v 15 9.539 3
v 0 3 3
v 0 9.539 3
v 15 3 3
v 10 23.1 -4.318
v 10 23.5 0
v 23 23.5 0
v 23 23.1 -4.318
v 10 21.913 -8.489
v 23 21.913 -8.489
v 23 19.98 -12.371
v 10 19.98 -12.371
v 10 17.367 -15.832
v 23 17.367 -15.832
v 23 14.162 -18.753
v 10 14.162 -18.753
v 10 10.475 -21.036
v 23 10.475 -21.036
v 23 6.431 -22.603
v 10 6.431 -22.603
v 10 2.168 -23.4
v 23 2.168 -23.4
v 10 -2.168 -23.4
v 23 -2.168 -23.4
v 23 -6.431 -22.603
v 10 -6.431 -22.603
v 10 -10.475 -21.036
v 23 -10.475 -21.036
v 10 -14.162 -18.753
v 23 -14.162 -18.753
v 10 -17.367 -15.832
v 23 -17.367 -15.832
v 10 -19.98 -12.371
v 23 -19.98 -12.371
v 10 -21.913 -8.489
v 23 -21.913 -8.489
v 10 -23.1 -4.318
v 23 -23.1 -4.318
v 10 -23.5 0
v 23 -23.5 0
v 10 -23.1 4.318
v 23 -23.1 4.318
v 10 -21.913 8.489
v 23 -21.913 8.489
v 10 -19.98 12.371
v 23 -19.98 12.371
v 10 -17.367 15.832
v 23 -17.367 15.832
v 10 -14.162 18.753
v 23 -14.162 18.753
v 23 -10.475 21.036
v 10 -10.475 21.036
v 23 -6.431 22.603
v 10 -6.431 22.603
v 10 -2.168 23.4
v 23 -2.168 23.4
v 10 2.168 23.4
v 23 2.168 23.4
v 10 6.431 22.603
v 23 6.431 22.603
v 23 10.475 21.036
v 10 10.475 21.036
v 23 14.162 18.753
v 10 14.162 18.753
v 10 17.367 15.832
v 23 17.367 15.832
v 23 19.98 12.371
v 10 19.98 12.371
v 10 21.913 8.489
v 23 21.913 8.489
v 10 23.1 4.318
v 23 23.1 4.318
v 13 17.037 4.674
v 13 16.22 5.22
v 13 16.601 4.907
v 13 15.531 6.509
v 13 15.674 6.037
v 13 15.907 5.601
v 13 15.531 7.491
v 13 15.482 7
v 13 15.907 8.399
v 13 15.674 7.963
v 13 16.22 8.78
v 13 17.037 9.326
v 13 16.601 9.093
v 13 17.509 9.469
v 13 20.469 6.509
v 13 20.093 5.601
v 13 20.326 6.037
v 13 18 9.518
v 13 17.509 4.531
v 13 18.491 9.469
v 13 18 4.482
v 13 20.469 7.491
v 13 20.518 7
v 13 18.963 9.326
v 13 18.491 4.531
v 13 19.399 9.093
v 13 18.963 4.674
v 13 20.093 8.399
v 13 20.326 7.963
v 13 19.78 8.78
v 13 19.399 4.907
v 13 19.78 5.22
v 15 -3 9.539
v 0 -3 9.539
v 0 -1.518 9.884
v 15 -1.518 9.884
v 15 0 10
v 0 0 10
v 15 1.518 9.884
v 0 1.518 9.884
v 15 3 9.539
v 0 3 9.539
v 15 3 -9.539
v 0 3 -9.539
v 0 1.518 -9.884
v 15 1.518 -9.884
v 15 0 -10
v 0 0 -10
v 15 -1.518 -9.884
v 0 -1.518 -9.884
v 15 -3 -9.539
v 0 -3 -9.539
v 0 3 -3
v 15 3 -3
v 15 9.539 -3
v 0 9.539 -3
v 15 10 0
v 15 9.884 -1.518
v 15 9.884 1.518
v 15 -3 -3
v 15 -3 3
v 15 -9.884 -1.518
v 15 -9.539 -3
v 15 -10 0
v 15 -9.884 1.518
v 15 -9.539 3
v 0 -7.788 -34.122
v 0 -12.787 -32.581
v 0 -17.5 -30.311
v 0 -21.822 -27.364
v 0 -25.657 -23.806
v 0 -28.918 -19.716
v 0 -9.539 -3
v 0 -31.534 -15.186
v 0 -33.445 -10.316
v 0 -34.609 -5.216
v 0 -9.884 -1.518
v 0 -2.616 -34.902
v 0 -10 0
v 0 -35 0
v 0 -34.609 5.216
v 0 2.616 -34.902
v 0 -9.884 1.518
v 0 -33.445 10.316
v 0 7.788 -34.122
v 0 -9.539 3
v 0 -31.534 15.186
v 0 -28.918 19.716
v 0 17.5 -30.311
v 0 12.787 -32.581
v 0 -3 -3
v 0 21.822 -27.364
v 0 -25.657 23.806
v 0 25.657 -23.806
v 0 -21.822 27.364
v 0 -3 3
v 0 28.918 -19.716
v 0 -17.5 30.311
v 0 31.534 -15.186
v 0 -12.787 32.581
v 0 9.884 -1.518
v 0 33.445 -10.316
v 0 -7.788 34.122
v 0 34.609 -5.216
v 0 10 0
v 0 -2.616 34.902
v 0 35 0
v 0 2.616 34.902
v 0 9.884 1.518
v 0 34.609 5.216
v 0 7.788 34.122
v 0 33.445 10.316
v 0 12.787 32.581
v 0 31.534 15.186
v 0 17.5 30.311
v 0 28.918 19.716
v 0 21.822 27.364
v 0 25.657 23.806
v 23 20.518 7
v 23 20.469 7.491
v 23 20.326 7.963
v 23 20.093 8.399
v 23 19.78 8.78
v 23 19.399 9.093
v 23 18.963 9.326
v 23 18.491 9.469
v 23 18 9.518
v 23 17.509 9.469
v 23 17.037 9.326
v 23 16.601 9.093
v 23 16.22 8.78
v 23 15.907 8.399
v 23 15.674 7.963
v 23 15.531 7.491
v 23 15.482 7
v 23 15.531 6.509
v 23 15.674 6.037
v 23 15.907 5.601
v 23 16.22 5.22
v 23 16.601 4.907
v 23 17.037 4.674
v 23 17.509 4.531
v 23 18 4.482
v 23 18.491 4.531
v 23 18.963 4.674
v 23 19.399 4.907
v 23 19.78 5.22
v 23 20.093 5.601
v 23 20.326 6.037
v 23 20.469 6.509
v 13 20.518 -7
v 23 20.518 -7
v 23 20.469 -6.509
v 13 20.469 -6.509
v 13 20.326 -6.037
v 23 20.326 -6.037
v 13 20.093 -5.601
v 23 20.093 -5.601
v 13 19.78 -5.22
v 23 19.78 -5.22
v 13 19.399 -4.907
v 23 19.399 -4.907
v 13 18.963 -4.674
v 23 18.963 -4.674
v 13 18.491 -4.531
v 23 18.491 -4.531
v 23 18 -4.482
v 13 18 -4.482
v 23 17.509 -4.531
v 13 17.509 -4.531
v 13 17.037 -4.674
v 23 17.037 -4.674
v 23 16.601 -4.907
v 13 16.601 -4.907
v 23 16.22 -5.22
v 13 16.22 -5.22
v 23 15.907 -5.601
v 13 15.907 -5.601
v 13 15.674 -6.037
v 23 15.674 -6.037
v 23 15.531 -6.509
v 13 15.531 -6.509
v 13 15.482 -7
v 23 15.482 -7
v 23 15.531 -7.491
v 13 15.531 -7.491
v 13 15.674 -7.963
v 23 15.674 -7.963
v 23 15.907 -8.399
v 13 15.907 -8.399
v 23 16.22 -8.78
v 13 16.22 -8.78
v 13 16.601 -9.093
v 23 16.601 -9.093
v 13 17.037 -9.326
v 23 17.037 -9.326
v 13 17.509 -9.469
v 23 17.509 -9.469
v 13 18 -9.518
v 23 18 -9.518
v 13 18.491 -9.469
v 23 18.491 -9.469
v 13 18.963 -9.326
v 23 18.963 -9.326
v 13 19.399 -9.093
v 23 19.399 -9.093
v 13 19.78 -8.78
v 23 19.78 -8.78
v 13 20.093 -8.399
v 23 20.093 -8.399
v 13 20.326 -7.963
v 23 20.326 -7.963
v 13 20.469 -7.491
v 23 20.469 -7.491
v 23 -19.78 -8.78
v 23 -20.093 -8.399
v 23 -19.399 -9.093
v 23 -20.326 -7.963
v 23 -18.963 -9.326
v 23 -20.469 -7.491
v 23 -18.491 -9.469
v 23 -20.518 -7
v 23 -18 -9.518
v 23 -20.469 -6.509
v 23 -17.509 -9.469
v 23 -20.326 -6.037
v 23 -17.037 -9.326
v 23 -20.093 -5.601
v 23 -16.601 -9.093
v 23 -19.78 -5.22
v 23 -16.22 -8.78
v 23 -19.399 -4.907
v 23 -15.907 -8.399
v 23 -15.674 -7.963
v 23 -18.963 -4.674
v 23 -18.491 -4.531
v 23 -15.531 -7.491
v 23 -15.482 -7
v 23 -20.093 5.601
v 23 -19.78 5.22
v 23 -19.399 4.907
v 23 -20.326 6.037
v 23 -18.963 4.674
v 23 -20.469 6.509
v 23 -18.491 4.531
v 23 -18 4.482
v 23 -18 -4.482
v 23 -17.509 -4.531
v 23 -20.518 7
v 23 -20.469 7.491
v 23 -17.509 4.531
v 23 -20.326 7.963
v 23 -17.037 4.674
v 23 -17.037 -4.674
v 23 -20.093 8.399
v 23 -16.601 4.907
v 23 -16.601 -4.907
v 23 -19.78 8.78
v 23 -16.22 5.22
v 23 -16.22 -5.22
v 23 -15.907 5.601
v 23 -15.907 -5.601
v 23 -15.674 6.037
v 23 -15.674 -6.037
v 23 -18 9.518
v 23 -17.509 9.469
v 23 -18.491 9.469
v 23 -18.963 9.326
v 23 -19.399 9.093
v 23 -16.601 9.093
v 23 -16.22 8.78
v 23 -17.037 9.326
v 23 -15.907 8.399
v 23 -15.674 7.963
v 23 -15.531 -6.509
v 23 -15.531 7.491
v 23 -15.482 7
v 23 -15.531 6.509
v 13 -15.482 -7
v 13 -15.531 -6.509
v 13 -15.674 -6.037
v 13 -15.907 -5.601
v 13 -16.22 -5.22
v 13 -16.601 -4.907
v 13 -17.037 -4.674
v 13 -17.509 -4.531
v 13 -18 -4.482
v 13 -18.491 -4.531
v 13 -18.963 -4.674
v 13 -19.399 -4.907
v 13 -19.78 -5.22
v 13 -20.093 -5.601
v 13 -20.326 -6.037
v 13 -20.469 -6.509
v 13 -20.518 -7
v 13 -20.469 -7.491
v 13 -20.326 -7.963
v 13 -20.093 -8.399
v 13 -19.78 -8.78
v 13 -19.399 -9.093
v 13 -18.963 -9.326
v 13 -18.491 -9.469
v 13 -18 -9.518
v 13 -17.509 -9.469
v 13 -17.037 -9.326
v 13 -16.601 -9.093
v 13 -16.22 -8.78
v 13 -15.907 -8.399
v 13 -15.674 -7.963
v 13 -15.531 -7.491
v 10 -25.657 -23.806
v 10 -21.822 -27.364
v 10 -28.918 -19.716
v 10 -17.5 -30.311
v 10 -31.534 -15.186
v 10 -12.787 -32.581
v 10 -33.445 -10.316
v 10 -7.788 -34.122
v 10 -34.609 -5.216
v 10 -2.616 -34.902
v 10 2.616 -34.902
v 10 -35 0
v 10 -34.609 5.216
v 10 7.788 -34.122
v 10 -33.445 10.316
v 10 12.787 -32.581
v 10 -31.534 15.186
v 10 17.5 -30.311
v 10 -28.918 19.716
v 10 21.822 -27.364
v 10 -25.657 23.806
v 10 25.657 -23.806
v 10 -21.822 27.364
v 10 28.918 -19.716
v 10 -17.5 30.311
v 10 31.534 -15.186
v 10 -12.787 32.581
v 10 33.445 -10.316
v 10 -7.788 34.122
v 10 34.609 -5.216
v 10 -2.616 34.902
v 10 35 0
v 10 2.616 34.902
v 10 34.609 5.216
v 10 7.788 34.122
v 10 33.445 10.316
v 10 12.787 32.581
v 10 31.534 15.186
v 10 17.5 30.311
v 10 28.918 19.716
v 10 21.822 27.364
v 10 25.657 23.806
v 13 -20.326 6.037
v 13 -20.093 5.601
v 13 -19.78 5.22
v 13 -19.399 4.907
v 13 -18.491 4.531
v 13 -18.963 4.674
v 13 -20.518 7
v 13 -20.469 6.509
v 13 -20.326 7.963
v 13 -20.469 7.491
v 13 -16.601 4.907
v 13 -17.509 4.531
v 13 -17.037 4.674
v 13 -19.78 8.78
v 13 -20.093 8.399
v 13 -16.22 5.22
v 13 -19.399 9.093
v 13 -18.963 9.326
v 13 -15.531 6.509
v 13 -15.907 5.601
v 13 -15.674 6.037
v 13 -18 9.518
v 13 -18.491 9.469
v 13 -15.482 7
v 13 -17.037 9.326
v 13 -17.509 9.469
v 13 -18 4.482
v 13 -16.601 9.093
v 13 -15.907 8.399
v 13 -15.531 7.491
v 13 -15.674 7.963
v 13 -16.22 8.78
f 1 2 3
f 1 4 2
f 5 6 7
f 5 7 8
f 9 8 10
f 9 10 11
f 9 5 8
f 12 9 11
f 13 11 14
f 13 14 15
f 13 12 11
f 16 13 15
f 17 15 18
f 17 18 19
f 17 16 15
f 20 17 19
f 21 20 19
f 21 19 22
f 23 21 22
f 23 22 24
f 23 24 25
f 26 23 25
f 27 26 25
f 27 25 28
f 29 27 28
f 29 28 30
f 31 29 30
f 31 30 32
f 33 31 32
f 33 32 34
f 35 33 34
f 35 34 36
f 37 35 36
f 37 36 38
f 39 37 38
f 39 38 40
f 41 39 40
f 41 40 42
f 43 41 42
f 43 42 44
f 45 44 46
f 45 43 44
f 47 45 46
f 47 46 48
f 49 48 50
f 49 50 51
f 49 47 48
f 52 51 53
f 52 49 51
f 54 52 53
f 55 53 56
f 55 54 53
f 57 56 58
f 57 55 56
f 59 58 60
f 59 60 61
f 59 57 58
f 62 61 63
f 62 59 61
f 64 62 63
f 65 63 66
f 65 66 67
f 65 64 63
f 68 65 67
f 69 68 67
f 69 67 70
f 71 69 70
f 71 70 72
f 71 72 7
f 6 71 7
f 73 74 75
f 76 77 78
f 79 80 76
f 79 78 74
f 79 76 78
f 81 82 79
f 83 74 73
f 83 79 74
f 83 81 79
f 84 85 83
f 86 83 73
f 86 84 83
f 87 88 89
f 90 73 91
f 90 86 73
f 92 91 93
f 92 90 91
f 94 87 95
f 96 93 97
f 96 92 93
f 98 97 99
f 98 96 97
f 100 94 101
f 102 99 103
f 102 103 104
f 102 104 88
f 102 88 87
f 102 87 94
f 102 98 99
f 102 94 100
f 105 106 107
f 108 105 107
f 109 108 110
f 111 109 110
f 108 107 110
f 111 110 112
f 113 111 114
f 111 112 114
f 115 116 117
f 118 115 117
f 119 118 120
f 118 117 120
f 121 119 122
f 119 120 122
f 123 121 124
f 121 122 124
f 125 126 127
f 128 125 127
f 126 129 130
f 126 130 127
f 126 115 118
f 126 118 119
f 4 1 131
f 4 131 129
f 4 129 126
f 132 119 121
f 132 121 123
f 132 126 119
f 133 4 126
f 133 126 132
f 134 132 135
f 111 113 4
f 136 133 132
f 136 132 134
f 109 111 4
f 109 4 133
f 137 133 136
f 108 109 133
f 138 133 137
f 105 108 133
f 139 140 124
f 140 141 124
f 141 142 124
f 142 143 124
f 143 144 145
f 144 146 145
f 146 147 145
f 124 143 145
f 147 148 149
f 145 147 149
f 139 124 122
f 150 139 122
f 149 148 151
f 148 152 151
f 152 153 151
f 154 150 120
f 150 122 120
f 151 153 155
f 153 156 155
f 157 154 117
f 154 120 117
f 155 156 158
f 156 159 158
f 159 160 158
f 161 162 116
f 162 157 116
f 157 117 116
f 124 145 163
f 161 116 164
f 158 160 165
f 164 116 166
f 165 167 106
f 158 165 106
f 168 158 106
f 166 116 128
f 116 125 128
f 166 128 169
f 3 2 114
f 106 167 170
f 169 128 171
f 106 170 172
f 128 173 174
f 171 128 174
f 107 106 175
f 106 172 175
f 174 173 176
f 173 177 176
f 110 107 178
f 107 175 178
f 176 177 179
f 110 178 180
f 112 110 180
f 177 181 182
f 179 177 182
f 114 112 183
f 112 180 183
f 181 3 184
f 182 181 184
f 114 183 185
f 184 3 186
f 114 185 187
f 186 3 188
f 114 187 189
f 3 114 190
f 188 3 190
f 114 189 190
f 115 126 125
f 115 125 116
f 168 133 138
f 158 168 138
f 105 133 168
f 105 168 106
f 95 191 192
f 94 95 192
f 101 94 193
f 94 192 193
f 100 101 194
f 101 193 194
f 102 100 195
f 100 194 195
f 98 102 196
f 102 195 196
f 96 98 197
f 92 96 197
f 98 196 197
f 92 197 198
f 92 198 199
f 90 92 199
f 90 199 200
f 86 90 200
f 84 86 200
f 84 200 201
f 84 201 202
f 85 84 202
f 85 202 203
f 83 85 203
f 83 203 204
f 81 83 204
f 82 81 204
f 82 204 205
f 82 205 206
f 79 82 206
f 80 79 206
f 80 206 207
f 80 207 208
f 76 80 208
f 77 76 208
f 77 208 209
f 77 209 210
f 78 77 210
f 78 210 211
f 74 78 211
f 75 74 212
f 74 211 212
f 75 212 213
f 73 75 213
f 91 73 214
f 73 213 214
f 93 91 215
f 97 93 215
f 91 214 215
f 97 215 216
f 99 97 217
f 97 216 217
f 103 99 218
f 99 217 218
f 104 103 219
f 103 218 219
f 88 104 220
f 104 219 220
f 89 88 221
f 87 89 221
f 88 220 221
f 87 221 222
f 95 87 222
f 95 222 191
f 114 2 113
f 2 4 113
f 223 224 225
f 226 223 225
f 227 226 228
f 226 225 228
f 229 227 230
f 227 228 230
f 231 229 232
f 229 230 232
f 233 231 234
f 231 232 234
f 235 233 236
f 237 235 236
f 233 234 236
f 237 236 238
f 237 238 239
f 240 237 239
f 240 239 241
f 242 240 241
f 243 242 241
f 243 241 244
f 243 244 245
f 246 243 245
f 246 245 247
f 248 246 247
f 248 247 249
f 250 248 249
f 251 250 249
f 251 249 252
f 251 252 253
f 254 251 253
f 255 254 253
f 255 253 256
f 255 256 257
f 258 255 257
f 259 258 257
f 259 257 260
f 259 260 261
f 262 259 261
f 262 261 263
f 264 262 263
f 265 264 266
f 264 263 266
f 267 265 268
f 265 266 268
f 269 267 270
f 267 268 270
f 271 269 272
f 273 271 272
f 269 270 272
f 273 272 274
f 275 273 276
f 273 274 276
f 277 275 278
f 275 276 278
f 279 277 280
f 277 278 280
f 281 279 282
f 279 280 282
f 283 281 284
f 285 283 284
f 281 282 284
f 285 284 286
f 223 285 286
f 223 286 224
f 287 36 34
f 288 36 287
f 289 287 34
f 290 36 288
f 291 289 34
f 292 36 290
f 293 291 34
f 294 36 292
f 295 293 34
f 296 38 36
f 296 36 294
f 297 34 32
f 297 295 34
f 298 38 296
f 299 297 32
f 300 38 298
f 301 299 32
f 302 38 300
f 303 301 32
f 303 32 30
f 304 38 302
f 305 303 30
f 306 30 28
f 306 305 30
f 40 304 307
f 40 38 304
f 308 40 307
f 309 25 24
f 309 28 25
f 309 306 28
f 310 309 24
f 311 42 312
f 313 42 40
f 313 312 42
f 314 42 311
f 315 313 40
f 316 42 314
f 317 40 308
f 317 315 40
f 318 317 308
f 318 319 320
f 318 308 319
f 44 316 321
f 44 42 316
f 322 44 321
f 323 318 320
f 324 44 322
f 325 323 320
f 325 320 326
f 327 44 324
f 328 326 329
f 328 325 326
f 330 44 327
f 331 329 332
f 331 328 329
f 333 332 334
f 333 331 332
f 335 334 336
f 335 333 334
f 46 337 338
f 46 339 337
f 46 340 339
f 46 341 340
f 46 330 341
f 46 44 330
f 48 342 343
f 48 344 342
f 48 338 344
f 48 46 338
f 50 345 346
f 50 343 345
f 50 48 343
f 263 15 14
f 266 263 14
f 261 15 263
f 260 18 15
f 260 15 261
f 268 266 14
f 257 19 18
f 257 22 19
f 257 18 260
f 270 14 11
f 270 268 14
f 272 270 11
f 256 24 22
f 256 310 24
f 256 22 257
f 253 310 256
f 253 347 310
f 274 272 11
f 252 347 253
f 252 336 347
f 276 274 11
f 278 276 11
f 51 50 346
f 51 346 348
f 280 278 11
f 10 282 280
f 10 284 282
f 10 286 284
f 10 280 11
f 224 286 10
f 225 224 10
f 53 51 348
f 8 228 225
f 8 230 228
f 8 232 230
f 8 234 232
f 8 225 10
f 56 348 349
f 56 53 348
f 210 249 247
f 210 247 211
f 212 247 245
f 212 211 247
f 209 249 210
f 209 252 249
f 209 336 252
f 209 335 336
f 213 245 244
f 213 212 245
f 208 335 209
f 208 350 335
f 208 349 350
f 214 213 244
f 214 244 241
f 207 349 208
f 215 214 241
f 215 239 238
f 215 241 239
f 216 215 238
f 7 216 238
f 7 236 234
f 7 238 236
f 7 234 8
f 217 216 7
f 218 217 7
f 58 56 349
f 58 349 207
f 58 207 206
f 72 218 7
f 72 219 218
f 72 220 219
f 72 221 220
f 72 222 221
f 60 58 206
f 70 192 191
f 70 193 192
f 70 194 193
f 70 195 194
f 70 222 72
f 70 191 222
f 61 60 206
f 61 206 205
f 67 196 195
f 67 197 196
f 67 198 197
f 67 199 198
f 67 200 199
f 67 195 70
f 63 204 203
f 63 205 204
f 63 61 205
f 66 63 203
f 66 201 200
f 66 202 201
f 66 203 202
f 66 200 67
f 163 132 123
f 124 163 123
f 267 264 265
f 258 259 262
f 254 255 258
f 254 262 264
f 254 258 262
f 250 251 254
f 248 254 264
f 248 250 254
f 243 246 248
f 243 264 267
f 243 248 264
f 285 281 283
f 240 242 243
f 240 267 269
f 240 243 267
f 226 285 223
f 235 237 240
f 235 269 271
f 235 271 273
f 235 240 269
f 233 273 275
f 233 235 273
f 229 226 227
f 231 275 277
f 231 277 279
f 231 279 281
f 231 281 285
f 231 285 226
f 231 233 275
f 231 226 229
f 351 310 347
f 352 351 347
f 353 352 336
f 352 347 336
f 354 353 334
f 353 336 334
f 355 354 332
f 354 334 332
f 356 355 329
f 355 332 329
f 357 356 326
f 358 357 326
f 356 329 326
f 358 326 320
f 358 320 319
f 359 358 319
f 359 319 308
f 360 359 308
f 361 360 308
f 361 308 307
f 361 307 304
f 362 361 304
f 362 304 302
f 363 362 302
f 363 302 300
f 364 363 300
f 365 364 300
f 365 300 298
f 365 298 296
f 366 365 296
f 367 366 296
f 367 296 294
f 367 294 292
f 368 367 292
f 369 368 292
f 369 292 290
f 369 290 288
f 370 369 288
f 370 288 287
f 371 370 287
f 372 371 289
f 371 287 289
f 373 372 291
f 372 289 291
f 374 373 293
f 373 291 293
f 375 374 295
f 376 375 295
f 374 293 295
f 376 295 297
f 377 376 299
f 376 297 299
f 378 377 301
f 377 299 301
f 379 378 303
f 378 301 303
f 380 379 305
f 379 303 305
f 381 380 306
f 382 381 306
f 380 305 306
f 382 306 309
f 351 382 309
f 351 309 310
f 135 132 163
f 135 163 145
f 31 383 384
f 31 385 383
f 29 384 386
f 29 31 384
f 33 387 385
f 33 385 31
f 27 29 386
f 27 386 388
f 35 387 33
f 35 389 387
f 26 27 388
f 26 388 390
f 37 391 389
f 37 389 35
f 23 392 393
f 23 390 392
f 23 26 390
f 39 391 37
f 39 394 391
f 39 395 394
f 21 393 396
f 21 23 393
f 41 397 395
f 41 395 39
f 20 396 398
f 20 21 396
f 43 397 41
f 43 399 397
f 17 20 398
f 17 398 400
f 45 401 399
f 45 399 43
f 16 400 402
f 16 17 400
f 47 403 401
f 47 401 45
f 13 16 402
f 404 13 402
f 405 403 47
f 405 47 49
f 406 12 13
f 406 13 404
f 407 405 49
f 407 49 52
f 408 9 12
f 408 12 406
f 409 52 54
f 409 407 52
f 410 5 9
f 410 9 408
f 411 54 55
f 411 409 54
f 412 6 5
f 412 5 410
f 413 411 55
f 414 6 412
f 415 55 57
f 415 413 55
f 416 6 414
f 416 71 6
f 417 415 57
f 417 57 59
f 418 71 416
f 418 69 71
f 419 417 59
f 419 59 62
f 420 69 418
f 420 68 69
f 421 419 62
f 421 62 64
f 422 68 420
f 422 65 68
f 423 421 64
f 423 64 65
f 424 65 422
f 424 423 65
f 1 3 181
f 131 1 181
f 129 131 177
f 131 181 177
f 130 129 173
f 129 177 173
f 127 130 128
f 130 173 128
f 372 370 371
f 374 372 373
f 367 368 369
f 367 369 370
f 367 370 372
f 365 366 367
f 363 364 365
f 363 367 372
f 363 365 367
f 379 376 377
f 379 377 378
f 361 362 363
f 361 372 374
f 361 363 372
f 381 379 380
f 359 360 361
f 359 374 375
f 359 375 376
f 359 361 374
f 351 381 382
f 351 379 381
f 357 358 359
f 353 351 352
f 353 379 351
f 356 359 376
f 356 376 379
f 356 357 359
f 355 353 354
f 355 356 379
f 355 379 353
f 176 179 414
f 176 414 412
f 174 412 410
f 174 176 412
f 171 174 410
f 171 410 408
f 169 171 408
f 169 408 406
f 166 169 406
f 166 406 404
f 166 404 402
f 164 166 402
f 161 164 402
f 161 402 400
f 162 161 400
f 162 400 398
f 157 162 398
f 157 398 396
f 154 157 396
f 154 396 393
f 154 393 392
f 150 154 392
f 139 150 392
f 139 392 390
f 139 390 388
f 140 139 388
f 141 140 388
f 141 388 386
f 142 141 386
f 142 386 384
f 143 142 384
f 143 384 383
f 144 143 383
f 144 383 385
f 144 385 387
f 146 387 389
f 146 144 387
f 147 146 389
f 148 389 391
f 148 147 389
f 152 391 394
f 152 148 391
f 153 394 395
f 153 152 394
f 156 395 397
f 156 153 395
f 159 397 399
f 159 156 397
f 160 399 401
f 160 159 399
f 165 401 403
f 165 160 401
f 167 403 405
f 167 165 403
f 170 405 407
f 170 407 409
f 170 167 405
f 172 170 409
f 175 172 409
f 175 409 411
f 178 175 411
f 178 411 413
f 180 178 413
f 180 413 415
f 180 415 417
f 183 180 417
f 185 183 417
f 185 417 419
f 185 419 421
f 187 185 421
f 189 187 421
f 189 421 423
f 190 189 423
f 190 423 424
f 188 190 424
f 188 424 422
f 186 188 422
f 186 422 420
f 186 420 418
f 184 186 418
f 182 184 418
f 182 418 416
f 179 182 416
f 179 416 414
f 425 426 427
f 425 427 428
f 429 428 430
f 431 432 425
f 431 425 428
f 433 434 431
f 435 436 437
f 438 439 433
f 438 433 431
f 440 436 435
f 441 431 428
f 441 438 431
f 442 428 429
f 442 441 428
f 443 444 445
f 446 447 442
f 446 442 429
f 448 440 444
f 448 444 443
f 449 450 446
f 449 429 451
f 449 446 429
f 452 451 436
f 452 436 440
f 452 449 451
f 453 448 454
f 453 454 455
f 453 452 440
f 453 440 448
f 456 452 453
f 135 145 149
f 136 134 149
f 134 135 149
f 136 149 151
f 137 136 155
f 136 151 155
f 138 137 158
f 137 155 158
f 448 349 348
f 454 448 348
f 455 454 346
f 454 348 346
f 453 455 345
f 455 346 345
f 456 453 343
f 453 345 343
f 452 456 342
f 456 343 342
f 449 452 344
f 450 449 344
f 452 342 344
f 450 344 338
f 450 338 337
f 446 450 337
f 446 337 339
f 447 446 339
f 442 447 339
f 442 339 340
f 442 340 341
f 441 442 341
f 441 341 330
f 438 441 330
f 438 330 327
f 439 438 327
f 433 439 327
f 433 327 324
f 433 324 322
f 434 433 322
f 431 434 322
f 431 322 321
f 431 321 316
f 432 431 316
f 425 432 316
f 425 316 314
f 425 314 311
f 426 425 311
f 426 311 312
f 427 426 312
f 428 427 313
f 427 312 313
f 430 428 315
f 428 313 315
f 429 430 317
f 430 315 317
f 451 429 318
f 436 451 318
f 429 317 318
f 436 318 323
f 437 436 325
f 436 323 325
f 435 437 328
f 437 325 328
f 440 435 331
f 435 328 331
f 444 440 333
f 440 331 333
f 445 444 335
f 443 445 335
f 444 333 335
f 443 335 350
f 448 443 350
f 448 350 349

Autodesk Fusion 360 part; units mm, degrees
sketch "Sketch1" plane through (0, 0, 0) normal (1, 0, 0) x (0, 1, 0)
  circle A0 centre (0, 0) radius 35
  dimension "d1" = 70
extrude "Extrude1" add sketch "Sketch1" along normal blind 10 in component "Encaixe"
sketch "Sketch3" plane through (10, 0, 0) normal (1, 0, 0) x (0, 1, 0)
  circle A0 centre (0, 0) radius 35
  circle A1 centre (0, 0) radius 23.5
  dimension "d9" = 47
extrude "Extrude2" add sketch "Sketch3" along normal blind 13 contours A1 in component "Encaixe"
ref_plane "WorkPlane1" through (0, 13, 0) normal (0, 1, 0) x (0, 0, 1)
sketch "Sketch4" plane through (0, 13, 0) normal (0, 1, 0) x (1, 0, 0)
  line L0 (23, 0) -> (23, -35)
  line L1 (23, -35) -> (23, -45)
  line L2 (23, -35) -> (30.3921, -43.8095)
  line L3 (30.3921, -43.8095) -> (35.3921, -43.8095)
  line L4 (23, 0) -> (57, 0)
  line L5 (35.3921, -43.8095) -> (52.4338, -23.5)
  line L6 (35.3921, -43.8095) -> (44, -43.8095)
  line L7 (52.4338, -23.5) -> (52.4338, 0)
  line L8 (52.4338, 23.5) -> (52.4338, 0)
  line L9 (35.3921, 43.8095) -> (52.4338, 23.5)
  line L10 (30.3921, 43.8095) -> (35.3921, 43.8095)
  line L11 (23, 35) -> (30.3921, 43.8095)
  line L12 (23, 0) -> (23, 35)
  dimension "d13" = 35
  dimension "d14" = 10
  dimension "d15" = 11.5
  dimension "d16" = 40
  dimension "d17" = 5
  dimension "d18" = 50
sketch "Sketch10" plane through (23, 0, 0) normal (1, 0, 0) x (0, 1, 0)
  circle A0 centre (0, 0) radius 23.5
  line L0 (0, 0) -> (18.3161, -14.7232) construction
  line L1 (0, 0) -> (18.3161, 14.7232) construction
  line L2 (0, 0) -> (-18.3161, 14.7232) construction
  line L3 (0, 0) -> (-18.3161, -14.7232) construction
  arc A1 (18.3161, -14.7232) -> (18.3161, 14.7232) centre (0, 0) ccw construction
  arc A2 (-18.3161, 14.7232) -> (-18.3161, -14.7232) centre (0, 0) ccw construction
  line L4 (0, 0) -> (-23.5, 0) construction
  line L5 (-23.5, 0) -> (-18, 0)
  line L6 (-18, 0) -> (-18, 7) construction
  circle A3 centre (-18, 7) radius 3
  circle A4 centre (-18, -7) radius 3
  line L7 (0, 0) -> (0, 10) construction
  circle A5 centre (18, 7) radius 3
  circle A6 centre (18, -7) radius 3
  dimension "d43" = 102.413
  dimension "d45" = 6
extrude "Extrude8" cut sketch "Sketch10" against normal blind 10 contours A3 | A4 | A5 | A6 in component "Encaixe"
thread "Thread1" "ISO Metric profile 6.0 M6x1 6H" major diameter 6.147 minor diameter 5.035 pitch 1 angle 60 resizes the face on face at (16.3333, -15.0037, 6.8505) in component "Encaixe"
thread "Thread2" "ISO Metric profile 6.0 M6x1 6H" major diameter 6.147 minor diameter 5.035 pitch 1 angle 60 resizes the face on face at (16.3333, 20.9963, 6.8505) in component "Encaixe"
thread "Thread3" "ISO Metric profile 6.0 M6x1 6H" major diameter 6.147 minor diameter 5.035 pitch 1 angle 60 resizes the face on face at (16.3333, -15.0037, -7.1495) in component "Encaixe"
thread "Thread4" "ISO Metric profile 6.0 M6x1 6H" major diameter 6.147 minor diameter 5.035 pitch 1 angle 60 resizes the face on face at (16.3333, 20.9963, -7.1495) in component "Encaixe"
sketch "Sketch11" plane through (0, 0, 0) normal (-1, 0, 0) x (0, -1, 0)
  circle A0 centre (0, 0) radius 35
  circle A1 centre (0, 0) radius 10
  dimension "d48" = 20
extrude "Extrude9" cut sketch "Sketch11" against normal blind 10 contours A1 in component "Encaixe"
extrude "Extrude10" cut 1 faces at (10, -3.1852, -0.9825) along direction (1, 0, 0) blind 5 in component "Encaixe"
sketch "Sketch12" plane through (15, 0, 0) normal (-1, 0, 0) x (0, -1, 0)
  circle A0 centre (0, 0) radius 10
  line L0 (3, 3) -> (3, 9.5394)
  line L1 (-3, 3) -> (-3, 9.5394)
  line L2 (-3, -3) -> (-9.5394, -3)
  line L3 (-3, 3) -> (-9.5394, 3)
  line L4 (3, -3) -> (3, -9.5394)
  line L5 (-3, -3) -> (-3, -9.5394)
  line L6 (3, 3) -> (9.5394, 3)
  line L7 (3, -3) -> (9.5394, -3)
extrude "Extrude11" add sketch "Sketch12" along normal blind 15 contours A0 L0 L6 | A0 L4 L7 | A0 L1 L3 | A0 L2 L5 in component "Encaixe"
component "Encaixe" placed x (1, 0, 0) y (0, 1, 0) z (0, 0, 1) at (0, 0, 0)
